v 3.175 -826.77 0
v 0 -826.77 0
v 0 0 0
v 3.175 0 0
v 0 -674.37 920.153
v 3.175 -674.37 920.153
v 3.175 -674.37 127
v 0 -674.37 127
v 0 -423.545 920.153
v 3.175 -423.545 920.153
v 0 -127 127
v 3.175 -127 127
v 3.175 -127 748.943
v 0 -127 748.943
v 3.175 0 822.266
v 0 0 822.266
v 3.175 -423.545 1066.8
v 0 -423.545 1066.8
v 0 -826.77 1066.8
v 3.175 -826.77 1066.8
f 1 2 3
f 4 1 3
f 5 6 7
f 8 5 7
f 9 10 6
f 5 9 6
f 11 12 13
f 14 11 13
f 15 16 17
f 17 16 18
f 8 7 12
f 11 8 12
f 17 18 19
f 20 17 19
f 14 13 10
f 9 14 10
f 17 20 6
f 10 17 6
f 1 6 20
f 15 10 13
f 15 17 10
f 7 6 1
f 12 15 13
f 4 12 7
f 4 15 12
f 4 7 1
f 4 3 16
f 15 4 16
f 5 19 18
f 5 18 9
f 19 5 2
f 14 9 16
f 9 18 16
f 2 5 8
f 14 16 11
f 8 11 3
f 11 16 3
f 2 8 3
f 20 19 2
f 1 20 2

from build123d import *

# Parameters (mm, degrees)
BOSS_EXTRUDE1_DEPTH = 3.175
CUT_EXTRUDE1_REACH  = 5.175


with BuildPart() as part:
    # Sketch1 → Boss-Extrude1 (new body)
    with BuildSketch(Plane(origin=(0, 0, 0), x_dir=(0, 0, -1), z_dir=(1, 0, 0))):
        Polygon((0, 0), (-822.266180236, 0), (-1066.8, -423.545), (-1066.8, -826.77), (0, -826.77), align=None)
    extrude(amount=BOSS_EXTRUDE1_DEPTH)

    # Sketch2 → Cut-Extrude1 (cut, up to next)
    with BuildSketch(Plane(origin=(3.175, 0, 0), x_dir=(0, 0, -1), z_dir=(1, 0, 0)), mode=Mode.PRIVATE) as cut_extrude1_sk1:
        Polygon((-748.942696049, -127), (-920.153031626, -423.545), (-920.153031626, -674.37), (-127, -674.37), (-127, -423.545), (-127, -127), align=None)
    cut_extrude1_tool1 = extrude(cut_extrude1_sk1.sketch, amount=-CUT_EXTRUDE1_REACH, mode=Mode.PRIVATE) & part.part
    add(cut_extrude1_tool1.solids().sort_by_distance((3.175, -411.543058, 502.491806))[0], mode=Mode.SUBTRACT)


solid = part.part
